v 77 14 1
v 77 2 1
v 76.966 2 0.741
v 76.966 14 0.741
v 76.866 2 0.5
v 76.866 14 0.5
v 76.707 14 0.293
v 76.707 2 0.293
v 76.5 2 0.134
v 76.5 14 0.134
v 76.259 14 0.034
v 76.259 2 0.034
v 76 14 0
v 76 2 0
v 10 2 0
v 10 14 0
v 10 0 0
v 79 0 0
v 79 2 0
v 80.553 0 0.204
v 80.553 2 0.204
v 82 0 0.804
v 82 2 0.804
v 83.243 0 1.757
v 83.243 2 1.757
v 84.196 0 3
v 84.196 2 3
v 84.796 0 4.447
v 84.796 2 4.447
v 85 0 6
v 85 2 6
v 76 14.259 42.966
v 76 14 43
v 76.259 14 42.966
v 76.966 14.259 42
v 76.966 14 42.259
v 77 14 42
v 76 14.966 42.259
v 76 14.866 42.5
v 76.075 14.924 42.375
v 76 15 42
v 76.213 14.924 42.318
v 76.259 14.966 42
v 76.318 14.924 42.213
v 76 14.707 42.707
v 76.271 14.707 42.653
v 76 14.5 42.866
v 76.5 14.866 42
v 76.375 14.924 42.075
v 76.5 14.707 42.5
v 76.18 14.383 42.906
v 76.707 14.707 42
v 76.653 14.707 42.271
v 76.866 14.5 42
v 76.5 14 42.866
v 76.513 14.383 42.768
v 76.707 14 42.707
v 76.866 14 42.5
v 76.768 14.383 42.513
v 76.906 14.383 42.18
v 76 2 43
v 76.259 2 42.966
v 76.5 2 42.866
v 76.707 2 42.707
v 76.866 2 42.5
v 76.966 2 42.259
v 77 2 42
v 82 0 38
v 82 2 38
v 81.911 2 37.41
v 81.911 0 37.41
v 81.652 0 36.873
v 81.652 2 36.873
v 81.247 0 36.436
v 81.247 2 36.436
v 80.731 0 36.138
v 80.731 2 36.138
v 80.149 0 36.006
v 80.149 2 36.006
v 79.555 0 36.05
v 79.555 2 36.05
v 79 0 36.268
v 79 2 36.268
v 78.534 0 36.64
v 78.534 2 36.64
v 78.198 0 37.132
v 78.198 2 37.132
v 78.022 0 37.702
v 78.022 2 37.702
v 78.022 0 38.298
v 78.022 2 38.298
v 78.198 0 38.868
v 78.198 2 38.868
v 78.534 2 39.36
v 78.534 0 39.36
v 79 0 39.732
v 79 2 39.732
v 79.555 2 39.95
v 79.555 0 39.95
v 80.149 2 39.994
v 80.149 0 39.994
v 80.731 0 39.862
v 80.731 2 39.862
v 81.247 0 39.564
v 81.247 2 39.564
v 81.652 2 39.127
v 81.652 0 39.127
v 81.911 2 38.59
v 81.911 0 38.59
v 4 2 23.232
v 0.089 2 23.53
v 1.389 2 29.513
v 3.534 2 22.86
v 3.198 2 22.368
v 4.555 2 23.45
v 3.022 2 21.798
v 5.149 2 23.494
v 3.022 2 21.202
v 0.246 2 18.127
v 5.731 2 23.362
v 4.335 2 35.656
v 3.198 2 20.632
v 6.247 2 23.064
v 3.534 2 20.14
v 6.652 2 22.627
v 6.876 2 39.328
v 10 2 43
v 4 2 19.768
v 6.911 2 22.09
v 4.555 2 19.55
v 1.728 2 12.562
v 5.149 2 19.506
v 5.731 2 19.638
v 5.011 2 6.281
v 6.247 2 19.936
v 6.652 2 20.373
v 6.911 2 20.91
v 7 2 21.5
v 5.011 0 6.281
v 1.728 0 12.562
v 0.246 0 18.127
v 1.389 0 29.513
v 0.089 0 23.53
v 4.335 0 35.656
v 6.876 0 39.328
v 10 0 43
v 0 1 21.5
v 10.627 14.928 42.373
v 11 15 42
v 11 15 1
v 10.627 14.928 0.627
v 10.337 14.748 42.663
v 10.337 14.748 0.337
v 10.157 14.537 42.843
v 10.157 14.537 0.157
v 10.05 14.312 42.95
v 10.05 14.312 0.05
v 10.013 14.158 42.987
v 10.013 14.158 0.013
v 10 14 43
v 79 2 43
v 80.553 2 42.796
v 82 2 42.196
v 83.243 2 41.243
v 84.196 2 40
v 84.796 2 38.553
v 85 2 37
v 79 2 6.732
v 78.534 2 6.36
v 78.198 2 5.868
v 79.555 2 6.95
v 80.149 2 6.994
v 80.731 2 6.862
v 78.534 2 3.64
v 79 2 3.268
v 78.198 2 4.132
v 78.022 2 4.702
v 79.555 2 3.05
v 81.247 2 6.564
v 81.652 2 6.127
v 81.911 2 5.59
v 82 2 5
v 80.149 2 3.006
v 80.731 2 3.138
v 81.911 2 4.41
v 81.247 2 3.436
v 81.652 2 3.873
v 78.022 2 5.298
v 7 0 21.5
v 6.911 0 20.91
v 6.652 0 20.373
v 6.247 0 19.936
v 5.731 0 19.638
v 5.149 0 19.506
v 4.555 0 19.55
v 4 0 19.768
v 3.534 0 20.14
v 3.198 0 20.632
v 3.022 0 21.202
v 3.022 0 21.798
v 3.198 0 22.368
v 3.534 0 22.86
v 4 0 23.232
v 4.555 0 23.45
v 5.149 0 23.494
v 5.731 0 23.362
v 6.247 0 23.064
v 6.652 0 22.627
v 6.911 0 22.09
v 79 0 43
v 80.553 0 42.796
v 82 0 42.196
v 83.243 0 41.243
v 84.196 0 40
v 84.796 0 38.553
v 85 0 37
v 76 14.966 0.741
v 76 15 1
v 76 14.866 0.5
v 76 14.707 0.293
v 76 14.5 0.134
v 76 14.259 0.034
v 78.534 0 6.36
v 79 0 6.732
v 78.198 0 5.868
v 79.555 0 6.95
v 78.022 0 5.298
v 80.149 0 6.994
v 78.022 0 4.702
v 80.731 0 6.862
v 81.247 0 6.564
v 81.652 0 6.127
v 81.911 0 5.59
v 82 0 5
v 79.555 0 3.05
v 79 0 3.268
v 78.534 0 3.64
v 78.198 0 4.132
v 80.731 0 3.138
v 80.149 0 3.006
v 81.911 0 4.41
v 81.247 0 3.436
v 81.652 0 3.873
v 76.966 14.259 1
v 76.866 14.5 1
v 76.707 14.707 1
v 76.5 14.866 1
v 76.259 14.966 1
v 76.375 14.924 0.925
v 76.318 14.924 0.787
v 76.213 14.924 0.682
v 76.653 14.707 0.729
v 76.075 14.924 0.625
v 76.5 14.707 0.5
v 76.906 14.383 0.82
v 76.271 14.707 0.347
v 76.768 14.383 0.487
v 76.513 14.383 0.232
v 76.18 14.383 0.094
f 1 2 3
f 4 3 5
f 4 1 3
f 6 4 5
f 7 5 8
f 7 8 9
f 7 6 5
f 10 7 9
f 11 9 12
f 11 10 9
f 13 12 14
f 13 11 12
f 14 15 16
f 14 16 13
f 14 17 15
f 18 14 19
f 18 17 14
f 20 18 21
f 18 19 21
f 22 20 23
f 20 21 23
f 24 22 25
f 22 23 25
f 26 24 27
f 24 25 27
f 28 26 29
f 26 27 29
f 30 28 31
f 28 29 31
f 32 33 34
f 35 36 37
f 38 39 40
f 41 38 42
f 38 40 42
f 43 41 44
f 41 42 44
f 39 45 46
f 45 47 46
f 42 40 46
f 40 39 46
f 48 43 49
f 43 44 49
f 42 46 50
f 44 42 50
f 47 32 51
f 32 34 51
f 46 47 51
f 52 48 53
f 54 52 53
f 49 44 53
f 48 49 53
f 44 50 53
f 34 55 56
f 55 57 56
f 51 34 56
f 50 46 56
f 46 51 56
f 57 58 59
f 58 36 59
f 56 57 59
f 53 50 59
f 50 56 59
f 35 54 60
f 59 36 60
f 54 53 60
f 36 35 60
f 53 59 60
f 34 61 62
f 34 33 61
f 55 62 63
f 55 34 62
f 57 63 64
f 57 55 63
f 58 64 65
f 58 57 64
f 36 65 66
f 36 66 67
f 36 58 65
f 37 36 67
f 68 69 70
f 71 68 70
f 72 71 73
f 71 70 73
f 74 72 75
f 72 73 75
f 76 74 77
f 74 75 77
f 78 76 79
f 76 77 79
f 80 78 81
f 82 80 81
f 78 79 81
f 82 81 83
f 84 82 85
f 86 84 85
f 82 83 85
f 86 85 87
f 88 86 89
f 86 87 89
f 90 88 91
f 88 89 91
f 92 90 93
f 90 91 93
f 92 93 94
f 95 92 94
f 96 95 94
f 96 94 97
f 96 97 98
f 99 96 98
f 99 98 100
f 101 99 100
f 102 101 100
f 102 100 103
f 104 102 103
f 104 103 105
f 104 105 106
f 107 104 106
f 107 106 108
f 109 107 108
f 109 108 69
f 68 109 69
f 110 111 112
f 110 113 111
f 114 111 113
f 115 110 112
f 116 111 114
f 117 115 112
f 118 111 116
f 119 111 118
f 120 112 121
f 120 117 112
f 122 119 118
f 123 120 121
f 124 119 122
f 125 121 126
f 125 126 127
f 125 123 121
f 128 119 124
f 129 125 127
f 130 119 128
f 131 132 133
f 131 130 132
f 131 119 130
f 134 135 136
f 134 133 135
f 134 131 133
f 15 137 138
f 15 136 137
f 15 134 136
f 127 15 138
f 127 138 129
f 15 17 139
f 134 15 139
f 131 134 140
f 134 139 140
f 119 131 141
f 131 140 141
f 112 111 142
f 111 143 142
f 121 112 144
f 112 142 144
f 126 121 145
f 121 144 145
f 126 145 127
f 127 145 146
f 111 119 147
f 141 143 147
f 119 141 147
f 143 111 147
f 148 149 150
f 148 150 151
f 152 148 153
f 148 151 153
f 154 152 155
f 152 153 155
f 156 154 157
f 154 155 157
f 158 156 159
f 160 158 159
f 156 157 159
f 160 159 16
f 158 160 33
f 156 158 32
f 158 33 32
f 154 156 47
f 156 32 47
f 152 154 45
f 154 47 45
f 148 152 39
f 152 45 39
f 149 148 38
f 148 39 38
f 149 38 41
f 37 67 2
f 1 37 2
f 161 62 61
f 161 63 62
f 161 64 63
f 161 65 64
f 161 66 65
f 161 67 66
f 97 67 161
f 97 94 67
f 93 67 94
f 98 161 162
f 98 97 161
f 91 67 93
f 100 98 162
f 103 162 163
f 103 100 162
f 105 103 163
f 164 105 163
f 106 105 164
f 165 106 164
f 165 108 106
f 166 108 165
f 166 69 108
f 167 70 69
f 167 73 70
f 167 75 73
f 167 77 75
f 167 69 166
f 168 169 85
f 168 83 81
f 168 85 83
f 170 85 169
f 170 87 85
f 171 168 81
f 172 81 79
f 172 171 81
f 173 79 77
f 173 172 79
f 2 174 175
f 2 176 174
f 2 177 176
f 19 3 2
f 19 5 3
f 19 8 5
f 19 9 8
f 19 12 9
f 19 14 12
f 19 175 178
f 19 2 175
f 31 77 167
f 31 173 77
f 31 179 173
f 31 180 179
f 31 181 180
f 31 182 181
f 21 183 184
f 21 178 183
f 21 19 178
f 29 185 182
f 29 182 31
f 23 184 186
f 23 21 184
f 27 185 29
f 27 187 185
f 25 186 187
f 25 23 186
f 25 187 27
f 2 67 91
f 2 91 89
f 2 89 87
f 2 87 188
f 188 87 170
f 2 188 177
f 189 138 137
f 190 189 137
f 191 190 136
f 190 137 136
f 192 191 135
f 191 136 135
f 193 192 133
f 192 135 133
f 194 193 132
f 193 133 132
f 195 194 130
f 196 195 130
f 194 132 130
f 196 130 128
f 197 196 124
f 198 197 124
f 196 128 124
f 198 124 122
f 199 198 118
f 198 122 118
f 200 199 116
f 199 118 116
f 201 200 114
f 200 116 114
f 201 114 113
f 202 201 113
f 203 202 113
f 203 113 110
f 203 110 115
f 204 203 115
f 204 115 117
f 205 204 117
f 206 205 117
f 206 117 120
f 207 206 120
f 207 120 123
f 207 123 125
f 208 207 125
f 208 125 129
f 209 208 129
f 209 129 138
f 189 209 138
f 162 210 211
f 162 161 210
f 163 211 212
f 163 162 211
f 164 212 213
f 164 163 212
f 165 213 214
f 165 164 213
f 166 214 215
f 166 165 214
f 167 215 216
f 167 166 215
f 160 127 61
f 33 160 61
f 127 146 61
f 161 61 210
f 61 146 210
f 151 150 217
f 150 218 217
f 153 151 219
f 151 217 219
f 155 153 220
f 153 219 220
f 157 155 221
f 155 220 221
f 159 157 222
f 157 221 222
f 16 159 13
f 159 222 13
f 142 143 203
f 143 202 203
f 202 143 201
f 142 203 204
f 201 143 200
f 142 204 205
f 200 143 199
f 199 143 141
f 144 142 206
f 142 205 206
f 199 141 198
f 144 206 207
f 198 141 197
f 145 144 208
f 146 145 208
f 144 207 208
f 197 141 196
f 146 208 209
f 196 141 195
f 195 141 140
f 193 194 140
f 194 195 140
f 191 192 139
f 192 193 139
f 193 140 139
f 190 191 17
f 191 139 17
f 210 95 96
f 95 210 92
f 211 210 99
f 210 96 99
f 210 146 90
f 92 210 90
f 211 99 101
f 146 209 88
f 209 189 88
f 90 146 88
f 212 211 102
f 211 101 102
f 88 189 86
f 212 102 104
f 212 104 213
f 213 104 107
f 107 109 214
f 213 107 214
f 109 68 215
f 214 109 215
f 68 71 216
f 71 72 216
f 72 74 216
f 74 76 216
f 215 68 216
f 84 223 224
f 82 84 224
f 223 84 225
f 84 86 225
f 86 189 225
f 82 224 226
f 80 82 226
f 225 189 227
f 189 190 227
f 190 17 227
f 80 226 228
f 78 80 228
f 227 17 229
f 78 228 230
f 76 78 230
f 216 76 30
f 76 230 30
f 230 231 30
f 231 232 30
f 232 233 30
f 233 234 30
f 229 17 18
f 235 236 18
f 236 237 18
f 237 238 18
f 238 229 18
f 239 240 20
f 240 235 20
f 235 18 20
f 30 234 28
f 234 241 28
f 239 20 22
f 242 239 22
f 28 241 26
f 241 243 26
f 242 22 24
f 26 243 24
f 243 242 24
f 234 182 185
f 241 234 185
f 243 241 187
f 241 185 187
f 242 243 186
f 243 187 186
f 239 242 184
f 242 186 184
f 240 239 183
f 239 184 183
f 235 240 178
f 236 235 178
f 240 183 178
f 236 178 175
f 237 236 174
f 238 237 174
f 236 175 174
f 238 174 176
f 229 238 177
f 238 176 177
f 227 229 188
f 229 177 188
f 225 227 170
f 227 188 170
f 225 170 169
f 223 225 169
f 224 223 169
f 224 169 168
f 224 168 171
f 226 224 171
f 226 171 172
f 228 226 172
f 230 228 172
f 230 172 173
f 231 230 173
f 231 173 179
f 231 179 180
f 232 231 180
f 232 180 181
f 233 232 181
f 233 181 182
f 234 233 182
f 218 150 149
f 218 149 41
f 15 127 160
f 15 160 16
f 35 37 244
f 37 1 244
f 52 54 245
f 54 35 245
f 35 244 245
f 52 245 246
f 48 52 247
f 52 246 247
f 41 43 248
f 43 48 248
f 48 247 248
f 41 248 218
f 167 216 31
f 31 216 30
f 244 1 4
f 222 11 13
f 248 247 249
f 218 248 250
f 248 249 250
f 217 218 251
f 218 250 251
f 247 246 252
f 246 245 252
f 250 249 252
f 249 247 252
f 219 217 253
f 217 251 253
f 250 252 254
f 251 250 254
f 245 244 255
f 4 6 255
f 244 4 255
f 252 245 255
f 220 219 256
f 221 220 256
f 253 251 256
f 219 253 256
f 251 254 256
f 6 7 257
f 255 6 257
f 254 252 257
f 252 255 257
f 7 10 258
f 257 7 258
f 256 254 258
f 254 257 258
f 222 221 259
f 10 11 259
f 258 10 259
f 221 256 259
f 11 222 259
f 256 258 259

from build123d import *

# Parameters (mm, degrees)
BOSS_EXTRUDE1_DEPTH = 2
SKETCH2_W           = 67
SKETCH2_H           = 43
BOSS_EXTRUDE2_DEPTH = 13
SKETCH3_R           = 2
CUT_EXTRUDE1_DEPTH  = 3.0000001
FILLET1_R           = 6
FILLET2_R           = 1


with BuildPart() as part:
    # Sketch1 → Boss-Extrude1 (new body)
    with BuildSketch(Plane(origin=(0, 0, 0), x_dir=(1, 0, 0), z_dir=(0, 1, 0))):
        with BuildLine():
            Line((85, 0), (10, 0))
            add(Edge.make_bspline(
                [(10, 0), (7e-09, -10.749999992), (0, -21.499999985)],
                knots=[0, 0, 0, 0.5, 0.5, 0.5], degree=2))
            add(Edge.make_bspline(
                [(0, -21.499999985), (-7e-09, -32.249999992), (10, -43)],
                knots=[0.5, 0.5, 0.5, 1, 1, 1], degree=2))
            Line((10, -43), (85, -43))
            Line((85, -43), (85, 0))
        make_face()
    extrude(amount=BOSS_EXTRUDE1_DEPTH)

    # Sketch2 → Boss-Extrude2 (add)
    with BuildSketch(Plane(origin=(0, 2, 0), x_dir=(1, 0, 0), z_dir=(0, 1, 0))):
        with Locations((43.5, -21.5)):
            Rectangle(SKETCH2_W, SKETCH2_H)
    extrude(amount=BOSS_EXTRUDE2_DEPTH)

    # Sketch3 → Cut-Extrude1 (cut, through all)
    with BuildSketch(Plane(origin=(0, 2, 0), x_dir=(1, 0, 0), z_dir=(0, 1, 0))):
        with Locations((80, -5)):
            Circle(SKETCH3_R)
        with Locations((80, -38)):
            Circle(SKETCH3_R)
        with Locations((5, -21.500000001)):
            Circle(SKETCH3_R)
    extrude(amount=-CUT_EXTRUDE1_DEPTH, mode=Mode.SUBTRACT)

    # Fillet1
    fillet1_edges = [part.edges().sort_by_distance(p)[0] for p in [
        (85, 1, 0),
        (85, 1, 43),
    ]]
    fillet(fillet1_edges, radius=FILLET1_R)

    # Fillet2
    fillet2_edges = [part.edges().sort_by_distance(p)[0] for p in [
        (77, 8.5, 43),
        (77, 8.5, 0),
        (10, 15, 21.5),
        (43.5, 15, 43),
        (77, 15, 21.5),
        (43.5, 15, 0),
    ]]
    fillet(fillet2_edges, radius=FILLET2_R)


solid = part.part
